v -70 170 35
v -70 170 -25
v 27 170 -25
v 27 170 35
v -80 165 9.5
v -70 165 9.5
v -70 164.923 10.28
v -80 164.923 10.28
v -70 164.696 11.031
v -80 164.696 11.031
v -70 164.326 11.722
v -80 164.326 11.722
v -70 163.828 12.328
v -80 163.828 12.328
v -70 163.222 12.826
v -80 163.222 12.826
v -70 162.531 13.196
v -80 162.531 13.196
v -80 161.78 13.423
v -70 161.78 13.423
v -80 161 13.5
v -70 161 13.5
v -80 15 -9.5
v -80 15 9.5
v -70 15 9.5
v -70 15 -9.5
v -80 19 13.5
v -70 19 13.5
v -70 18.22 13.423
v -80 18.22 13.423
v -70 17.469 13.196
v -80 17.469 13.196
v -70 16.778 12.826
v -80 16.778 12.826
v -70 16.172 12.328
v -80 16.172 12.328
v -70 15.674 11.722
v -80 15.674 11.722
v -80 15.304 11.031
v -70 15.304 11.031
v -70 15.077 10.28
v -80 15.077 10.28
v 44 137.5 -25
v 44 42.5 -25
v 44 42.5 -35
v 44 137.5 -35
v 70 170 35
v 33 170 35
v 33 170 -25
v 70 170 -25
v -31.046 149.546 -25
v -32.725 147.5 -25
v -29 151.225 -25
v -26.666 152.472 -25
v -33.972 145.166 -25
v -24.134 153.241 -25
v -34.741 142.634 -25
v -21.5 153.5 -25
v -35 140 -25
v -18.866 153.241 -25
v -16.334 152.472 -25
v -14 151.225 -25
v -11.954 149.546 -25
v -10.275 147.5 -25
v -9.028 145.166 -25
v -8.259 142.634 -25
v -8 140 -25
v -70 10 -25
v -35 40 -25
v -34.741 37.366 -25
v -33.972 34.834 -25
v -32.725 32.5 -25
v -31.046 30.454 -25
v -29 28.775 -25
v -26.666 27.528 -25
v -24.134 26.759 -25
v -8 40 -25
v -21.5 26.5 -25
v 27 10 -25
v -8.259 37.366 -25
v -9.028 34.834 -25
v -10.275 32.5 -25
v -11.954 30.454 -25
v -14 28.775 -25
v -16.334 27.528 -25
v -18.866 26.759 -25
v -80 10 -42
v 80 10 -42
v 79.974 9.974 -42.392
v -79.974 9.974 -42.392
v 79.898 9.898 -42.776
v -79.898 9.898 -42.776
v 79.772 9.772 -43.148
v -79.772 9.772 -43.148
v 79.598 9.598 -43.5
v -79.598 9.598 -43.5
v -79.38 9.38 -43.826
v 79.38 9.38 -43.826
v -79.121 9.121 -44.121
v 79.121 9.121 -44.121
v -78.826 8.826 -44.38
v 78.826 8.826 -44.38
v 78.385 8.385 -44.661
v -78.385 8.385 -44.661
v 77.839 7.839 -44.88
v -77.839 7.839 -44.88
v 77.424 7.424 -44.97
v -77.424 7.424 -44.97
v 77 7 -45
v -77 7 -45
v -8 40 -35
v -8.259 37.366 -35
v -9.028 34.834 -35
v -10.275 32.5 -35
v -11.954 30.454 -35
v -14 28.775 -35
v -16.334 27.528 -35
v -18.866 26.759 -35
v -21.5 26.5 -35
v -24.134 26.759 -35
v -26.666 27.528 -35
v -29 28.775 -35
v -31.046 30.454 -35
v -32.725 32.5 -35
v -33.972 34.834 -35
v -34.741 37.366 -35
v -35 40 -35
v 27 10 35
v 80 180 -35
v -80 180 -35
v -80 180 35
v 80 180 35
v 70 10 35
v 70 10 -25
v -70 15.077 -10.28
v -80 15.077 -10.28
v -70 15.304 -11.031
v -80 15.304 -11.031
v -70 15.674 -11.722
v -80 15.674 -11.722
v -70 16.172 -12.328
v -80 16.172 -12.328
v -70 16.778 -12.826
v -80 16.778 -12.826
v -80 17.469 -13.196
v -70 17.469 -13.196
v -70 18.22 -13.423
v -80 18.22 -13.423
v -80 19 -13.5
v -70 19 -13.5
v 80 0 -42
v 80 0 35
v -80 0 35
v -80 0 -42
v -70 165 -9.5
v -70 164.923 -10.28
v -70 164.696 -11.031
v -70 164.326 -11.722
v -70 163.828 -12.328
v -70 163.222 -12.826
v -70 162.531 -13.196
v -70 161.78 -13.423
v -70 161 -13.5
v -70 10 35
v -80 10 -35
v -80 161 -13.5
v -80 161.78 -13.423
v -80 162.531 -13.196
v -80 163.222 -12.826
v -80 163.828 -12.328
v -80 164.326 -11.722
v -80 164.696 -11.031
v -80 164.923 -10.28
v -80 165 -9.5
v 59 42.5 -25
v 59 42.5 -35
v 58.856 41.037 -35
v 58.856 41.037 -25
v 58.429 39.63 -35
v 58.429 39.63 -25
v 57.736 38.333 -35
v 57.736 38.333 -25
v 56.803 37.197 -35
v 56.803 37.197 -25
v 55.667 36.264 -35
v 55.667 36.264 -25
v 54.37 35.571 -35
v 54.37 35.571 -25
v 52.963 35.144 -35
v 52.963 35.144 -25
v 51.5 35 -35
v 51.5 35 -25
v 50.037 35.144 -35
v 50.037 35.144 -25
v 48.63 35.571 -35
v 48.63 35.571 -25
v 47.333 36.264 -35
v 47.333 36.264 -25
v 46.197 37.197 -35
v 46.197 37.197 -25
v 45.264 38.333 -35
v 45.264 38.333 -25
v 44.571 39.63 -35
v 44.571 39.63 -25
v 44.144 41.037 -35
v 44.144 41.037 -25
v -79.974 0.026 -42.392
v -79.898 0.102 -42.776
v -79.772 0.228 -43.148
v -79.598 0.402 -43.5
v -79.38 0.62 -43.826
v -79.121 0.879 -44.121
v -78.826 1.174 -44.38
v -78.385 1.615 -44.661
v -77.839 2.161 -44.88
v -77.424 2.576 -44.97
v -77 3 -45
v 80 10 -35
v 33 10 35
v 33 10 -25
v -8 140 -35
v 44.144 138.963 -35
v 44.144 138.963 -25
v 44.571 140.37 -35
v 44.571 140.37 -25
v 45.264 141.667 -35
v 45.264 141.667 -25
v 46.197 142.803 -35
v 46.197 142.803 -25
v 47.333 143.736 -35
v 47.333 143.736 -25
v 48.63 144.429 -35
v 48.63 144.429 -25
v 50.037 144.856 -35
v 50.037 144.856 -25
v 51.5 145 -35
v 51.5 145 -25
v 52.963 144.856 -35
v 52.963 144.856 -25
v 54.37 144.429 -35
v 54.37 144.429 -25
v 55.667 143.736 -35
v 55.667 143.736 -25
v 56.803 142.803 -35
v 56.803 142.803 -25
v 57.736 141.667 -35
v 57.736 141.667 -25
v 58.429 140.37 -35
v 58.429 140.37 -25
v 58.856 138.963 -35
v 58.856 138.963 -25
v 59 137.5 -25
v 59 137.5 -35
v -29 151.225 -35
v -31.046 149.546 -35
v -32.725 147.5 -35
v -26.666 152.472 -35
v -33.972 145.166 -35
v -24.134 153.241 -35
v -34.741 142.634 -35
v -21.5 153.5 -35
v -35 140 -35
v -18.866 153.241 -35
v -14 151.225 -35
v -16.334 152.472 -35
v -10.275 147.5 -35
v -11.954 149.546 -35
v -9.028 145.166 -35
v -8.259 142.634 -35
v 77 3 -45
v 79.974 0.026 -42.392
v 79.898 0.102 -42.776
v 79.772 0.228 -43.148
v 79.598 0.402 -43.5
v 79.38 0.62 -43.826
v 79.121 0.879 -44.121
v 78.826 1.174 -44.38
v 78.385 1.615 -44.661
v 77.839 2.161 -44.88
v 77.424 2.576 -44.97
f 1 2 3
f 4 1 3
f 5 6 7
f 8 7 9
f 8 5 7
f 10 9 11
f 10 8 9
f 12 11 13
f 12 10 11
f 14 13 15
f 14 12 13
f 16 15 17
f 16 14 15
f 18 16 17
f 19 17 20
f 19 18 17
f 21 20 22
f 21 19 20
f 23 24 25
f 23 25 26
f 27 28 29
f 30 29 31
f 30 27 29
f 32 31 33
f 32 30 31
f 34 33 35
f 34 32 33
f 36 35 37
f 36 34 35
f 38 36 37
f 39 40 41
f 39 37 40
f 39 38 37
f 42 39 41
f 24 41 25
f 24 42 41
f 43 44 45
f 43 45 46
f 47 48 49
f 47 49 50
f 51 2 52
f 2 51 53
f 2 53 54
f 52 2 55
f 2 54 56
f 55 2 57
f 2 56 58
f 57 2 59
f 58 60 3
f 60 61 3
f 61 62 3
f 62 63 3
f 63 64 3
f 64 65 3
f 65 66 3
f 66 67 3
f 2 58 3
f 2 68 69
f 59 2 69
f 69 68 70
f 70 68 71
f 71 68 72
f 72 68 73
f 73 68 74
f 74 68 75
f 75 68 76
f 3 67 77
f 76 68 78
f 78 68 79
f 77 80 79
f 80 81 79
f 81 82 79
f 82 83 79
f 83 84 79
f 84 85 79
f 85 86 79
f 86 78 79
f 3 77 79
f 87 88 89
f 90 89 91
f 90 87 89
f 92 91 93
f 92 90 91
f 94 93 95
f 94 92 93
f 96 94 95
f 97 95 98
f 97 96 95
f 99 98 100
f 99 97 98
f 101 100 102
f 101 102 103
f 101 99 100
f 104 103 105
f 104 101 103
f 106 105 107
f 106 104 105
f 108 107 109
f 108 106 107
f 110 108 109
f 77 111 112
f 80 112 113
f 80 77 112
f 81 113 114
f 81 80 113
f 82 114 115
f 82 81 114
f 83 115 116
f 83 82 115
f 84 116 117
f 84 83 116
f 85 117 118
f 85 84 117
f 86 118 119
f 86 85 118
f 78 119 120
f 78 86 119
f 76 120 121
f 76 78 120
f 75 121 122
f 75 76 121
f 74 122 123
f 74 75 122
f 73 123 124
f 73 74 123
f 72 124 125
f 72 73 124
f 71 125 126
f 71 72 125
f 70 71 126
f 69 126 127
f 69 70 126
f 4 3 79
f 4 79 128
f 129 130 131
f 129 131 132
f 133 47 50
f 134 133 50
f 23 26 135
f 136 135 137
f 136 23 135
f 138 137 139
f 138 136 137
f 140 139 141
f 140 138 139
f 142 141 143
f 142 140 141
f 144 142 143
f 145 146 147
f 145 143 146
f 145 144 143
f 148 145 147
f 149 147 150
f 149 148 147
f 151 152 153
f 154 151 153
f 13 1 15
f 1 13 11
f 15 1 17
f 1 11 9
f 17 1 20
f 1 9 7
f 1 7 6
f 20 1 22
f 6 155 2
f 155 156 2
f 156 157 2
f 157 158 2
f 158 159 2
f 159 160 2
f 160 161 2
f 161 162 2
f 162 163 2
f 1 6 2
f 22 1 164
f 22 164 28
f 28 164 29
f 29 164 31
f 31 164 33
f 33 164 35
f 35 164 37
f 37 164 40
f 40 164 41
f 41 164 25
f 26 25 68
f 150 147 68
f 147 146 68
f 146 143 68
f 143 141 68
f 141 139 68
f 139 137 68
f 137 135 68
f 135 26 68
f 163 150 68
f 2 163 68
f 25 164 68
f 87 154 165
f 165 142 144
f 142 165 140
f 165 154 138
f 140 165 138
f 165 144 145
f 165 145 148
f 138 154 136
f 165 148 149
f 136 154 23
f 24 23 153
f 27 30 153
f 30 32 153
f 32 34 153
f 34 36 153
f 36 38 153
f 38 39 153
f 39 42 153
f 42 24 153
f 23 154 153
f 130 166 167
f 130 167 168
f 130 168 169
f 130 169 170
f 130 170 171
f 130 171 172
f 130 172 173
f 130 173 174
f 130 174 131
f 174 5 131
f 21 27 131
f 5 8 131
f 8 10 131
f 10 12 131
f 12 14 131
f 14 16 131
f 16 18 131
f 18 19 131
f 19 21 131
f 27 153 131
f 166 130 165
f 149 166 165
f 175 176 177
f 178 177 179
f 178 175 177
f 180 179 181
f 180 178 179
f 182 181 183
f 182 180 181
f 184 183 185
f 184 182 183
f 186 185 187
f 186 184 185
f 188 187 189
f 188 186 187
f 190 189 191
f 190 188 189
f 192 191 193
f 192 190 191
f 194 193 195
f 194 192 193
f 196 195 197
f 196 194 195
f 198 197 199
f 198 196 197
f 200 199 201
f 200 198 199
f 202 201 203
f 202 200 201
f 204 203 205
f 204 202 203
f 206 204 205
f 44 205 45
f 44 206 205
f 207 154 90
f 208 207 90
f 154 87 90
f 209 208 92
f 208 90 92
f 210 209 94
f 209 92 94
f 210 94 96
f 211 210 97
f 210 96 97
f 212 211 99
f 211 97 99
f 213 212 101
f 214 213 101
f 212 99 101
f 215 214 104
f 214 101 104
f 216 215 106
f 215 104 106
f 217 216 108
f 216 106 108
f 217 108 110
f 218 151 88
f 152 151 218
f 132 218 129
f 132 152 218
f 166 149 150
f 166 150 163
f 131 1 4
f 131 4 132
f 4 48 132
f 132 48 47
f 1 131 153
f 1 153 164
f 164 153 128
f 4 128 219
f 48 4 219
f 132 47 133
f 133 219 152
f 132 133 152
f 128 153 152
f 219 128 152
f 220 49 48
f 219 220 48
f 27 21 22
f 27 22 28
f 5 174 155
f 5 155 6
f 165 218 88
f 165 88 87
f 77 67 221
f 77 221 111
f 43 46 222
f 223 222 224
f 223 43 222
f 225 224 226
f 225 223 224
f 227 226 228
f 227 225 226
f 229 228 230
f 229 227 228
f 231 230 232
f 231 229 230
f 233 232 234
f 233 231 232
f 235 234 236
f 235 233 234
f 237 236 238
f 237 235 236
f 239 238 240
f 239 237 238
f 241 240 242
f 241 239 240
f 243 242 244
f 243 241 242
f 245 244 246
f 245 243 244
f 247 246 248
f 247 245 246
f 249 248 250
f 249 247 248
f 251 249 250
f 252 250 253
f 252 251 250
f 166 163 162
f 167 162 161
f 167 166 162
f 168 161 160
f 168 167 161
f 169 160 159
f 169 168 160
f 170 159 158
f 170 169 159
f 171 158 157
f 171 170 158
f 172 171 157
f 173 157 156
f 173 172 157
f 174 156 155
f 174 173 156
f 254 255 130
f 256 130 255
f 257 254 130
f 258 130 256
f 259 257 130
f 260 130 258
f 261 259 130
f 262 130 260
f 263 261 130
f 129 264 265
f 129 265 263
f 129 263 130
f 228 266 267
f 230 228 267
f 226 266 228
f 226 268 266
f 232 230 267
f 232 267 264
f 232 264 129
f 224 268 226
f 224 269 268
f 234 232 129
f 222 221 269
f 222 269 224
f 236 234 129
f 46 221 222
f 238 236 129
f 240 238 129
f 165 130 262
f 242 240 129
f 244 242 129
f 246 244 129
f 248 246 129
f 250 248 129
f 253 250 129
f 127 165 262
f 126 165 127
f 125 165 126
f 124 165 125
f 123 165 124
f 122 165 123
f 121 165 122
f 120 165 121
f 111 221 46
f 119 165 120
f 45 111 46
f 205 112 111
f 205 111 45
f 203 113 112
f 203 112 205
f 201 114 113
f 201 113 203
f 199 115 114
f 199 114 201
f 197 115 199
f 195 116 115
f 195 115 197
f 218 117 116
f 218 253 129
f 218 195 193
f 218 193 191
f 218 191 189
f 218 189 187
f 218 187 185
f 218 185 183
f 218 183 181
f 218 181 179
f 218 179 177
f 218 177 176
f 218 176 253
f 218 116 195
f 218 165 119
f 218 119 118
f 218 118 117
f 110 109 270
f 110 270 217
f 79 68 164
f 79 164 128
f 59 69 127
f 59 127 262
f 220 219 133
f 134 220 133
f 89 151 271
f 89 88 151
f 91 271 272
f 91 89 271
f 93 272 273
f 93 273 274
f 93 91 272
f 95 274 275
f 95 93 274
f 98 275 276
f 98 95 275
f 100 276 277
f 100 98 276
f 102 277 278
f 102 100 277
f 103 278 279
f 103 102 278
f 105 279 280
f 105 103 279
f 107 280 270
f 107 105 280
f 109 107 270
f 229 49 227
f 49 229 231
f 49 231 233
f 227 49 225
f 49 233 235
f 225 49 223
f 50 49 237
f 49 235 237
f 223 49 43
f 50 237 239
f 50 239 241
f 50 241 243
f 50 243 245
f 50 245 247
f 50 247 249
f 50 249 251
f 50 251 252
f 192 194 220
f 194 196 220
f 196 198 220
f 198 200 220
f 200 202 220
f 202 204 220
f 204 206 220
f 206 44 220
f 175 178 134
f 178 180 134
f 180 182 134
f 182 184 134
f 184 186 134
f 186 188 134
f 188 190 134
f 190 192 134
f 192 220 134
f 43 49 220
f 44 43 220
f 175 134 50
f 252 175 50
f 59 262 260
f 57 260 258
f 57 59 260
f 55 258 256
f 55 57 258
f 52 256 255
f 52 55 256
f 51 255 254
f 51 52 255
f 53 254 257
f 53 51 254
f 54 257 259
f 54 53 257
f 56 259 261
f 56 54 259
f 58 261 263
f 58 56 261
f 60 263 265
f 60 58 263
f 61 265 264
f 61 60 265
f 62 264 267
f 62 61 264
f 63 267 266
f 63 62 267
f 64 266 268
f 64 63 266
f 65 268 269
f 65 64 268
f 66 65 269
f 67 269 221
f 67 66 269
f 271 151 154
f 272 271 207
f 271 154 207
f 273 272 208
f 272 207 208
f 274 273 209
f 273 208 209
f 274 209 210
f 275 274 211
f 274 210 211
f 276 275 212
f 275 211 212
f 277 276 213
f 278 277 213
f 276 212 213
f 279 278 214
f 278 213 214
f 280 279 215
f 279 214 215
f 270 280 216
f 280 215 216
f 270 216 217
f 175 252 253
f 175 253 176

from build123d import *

# Parameters (mm, degrees)
SKETCH_1_W          = 160
SKETCH_1_H          = 70
EXTRUDE_1_DEPTH     = 180
SHELL_1_T           = -10
SKETCH_2_W          = 3
SKETCH_2_H          = 70
EXTRUDE_2_DEPTH     = 170
CUT_EXTRUDE_1_DEPTH = 170
CUT_EXTRUDE_2_DEPTH = 170
CUT_EXTRUDE_3_REACH = 245.362
SKETCH_6_W          = 160
SKETCH_6_H          = 10
EXTRUDE_3_DEPTH     = 10
FILLET_1_R          = 3


with BuildPart() as part:
    # 草图1 → 凸台-拉伸1 (new body)
    with BuildSketch(Plane(origin=(0, 0, 0), x_dir=(1, 0, 0), z_dir=(0, 1, 0))):
        Rectangle(SKETCH_1_W, SKETCH_1_H)
    extrude(amount=EXTRUDE_1_DEPTH)

    # 抽壳1
    shell_1_openings = [part.faces().sort_by_distance(p)[0] for p in [
        (0, 90, 35),
    ]]
    offset(amount=SHELL_1_T, openings=shell_1_openings, kind=Kind.INTERSECTION)

    # 草图2 → 凸台-拉伸2 (add)
    with BuildSketch(Plane.XZ):
        with Locations((31.5, 0)):
            Rectangle(SKETCH_2_W, SKETCH_2_H)
        with Locations((28.5, 0)):
            Rectangle(SKETCH_2_W, SKETCH_2_H)
    extrude(amount=-EXTRUDE_2_DEPTH)

    # 草图3 → 切除-拉伸1 (cut)
    with BuildSketch(Plane.XY.offset(-25)):
        with BuildLine():
            Line((-8, 140), (-8, 40))
            ThreePointArc((-8, 40), (-21.5, 26.5), (-35, 40))
            Line((-35, 40), (-35, 140))
            ThreePointArc((-35, 140), (-21.5, 153.5), (-8, 140))
        make_face()
    extrude(amount=-CUT_EXTRUDE_1_DEPTH, mode=Mode.SUBTRACT)

    # 草图4 → 切除-拉伸2 (cut)
    with BuildSketch(Plane.XY.offset(-25)):
        with BuildLine():
            Line((59, 137.5), (59, 42.5))
            ThreePointArc((59, 42.5), (51.5, 35), (44, 42.5))
            Line((44, 42.5), (44, 137.5))
            ThreePointArc((44, 137.5), (51.5, 145), (59, 137.5))
        make_face()
    extrude(amount=-CUT_EXTRUDE_2_DEPTH, mode=Mode.SUBTRACT)

    # 草图5 → 切除-拉伸3 (cut, up to next)
    with BuildSketch(Plane.ZY.offset(80), mode=Mode.PRIVATE) as cut_extrude_3_sk1:
        with BuildLine():
            Line((-9.5, 165), (9.5, 165))
            ThreePointArc((9.5, 165), (12.328427125, 163.828427125), (13.5, 161))
            Line((13.5, 161), (13.5, 19))
            ThreePointArc((13.5, 19), (12.328427125, 16.171572875), (9.5, 15))
            Line((9.5, 15), (-9.5, 15))
            ThreePointArc((-9.5, 15), (-12.328427125, 16.171572875), (-13.5, 19))
            Line((-13.5, 19), (-13.5, 161))
            ThreePointArc((-13.5, 161), (-12.328427125, 163.828427125), (-9.5, 165))
        make_face()
    cut_extrude_3_tool1 = extrude(cut_extrude_3_sk1.sketch, amount=-CUT_EXTRUDE_3_REACH, mode=Mode.PRIVATE) & part.part
    add(cut_extrude_3_tool1.solids().sort_by_distance((-80, 90, 0))[0], mode=Mode.SUBTRACT)

    # 草图6 → 凸台-拉伸3 (add)
    with BuildSketch(Plane(origin=(0, 0, -35), x_dir=(-1, 0, 0), z_dir=(0, 0, -1))):
        with Locations((0, 5)):
            Rectangle(SKETCH_6_W, SKETCH_6_H)
    extrude(amount=EXTRUDE_3_DEPTH)

    # 圆角1
    fillet_1_edges = [part.edges().sort_by_distance(p)[0] for p in [
        (80, 5, -45),
        (0, 0, -45),
        (-80, 5, -45),
        (0, 10, -45),
    ]]
    fillet(fillet_1_edges, radius=FILLET_1_R)


solid = part.part
